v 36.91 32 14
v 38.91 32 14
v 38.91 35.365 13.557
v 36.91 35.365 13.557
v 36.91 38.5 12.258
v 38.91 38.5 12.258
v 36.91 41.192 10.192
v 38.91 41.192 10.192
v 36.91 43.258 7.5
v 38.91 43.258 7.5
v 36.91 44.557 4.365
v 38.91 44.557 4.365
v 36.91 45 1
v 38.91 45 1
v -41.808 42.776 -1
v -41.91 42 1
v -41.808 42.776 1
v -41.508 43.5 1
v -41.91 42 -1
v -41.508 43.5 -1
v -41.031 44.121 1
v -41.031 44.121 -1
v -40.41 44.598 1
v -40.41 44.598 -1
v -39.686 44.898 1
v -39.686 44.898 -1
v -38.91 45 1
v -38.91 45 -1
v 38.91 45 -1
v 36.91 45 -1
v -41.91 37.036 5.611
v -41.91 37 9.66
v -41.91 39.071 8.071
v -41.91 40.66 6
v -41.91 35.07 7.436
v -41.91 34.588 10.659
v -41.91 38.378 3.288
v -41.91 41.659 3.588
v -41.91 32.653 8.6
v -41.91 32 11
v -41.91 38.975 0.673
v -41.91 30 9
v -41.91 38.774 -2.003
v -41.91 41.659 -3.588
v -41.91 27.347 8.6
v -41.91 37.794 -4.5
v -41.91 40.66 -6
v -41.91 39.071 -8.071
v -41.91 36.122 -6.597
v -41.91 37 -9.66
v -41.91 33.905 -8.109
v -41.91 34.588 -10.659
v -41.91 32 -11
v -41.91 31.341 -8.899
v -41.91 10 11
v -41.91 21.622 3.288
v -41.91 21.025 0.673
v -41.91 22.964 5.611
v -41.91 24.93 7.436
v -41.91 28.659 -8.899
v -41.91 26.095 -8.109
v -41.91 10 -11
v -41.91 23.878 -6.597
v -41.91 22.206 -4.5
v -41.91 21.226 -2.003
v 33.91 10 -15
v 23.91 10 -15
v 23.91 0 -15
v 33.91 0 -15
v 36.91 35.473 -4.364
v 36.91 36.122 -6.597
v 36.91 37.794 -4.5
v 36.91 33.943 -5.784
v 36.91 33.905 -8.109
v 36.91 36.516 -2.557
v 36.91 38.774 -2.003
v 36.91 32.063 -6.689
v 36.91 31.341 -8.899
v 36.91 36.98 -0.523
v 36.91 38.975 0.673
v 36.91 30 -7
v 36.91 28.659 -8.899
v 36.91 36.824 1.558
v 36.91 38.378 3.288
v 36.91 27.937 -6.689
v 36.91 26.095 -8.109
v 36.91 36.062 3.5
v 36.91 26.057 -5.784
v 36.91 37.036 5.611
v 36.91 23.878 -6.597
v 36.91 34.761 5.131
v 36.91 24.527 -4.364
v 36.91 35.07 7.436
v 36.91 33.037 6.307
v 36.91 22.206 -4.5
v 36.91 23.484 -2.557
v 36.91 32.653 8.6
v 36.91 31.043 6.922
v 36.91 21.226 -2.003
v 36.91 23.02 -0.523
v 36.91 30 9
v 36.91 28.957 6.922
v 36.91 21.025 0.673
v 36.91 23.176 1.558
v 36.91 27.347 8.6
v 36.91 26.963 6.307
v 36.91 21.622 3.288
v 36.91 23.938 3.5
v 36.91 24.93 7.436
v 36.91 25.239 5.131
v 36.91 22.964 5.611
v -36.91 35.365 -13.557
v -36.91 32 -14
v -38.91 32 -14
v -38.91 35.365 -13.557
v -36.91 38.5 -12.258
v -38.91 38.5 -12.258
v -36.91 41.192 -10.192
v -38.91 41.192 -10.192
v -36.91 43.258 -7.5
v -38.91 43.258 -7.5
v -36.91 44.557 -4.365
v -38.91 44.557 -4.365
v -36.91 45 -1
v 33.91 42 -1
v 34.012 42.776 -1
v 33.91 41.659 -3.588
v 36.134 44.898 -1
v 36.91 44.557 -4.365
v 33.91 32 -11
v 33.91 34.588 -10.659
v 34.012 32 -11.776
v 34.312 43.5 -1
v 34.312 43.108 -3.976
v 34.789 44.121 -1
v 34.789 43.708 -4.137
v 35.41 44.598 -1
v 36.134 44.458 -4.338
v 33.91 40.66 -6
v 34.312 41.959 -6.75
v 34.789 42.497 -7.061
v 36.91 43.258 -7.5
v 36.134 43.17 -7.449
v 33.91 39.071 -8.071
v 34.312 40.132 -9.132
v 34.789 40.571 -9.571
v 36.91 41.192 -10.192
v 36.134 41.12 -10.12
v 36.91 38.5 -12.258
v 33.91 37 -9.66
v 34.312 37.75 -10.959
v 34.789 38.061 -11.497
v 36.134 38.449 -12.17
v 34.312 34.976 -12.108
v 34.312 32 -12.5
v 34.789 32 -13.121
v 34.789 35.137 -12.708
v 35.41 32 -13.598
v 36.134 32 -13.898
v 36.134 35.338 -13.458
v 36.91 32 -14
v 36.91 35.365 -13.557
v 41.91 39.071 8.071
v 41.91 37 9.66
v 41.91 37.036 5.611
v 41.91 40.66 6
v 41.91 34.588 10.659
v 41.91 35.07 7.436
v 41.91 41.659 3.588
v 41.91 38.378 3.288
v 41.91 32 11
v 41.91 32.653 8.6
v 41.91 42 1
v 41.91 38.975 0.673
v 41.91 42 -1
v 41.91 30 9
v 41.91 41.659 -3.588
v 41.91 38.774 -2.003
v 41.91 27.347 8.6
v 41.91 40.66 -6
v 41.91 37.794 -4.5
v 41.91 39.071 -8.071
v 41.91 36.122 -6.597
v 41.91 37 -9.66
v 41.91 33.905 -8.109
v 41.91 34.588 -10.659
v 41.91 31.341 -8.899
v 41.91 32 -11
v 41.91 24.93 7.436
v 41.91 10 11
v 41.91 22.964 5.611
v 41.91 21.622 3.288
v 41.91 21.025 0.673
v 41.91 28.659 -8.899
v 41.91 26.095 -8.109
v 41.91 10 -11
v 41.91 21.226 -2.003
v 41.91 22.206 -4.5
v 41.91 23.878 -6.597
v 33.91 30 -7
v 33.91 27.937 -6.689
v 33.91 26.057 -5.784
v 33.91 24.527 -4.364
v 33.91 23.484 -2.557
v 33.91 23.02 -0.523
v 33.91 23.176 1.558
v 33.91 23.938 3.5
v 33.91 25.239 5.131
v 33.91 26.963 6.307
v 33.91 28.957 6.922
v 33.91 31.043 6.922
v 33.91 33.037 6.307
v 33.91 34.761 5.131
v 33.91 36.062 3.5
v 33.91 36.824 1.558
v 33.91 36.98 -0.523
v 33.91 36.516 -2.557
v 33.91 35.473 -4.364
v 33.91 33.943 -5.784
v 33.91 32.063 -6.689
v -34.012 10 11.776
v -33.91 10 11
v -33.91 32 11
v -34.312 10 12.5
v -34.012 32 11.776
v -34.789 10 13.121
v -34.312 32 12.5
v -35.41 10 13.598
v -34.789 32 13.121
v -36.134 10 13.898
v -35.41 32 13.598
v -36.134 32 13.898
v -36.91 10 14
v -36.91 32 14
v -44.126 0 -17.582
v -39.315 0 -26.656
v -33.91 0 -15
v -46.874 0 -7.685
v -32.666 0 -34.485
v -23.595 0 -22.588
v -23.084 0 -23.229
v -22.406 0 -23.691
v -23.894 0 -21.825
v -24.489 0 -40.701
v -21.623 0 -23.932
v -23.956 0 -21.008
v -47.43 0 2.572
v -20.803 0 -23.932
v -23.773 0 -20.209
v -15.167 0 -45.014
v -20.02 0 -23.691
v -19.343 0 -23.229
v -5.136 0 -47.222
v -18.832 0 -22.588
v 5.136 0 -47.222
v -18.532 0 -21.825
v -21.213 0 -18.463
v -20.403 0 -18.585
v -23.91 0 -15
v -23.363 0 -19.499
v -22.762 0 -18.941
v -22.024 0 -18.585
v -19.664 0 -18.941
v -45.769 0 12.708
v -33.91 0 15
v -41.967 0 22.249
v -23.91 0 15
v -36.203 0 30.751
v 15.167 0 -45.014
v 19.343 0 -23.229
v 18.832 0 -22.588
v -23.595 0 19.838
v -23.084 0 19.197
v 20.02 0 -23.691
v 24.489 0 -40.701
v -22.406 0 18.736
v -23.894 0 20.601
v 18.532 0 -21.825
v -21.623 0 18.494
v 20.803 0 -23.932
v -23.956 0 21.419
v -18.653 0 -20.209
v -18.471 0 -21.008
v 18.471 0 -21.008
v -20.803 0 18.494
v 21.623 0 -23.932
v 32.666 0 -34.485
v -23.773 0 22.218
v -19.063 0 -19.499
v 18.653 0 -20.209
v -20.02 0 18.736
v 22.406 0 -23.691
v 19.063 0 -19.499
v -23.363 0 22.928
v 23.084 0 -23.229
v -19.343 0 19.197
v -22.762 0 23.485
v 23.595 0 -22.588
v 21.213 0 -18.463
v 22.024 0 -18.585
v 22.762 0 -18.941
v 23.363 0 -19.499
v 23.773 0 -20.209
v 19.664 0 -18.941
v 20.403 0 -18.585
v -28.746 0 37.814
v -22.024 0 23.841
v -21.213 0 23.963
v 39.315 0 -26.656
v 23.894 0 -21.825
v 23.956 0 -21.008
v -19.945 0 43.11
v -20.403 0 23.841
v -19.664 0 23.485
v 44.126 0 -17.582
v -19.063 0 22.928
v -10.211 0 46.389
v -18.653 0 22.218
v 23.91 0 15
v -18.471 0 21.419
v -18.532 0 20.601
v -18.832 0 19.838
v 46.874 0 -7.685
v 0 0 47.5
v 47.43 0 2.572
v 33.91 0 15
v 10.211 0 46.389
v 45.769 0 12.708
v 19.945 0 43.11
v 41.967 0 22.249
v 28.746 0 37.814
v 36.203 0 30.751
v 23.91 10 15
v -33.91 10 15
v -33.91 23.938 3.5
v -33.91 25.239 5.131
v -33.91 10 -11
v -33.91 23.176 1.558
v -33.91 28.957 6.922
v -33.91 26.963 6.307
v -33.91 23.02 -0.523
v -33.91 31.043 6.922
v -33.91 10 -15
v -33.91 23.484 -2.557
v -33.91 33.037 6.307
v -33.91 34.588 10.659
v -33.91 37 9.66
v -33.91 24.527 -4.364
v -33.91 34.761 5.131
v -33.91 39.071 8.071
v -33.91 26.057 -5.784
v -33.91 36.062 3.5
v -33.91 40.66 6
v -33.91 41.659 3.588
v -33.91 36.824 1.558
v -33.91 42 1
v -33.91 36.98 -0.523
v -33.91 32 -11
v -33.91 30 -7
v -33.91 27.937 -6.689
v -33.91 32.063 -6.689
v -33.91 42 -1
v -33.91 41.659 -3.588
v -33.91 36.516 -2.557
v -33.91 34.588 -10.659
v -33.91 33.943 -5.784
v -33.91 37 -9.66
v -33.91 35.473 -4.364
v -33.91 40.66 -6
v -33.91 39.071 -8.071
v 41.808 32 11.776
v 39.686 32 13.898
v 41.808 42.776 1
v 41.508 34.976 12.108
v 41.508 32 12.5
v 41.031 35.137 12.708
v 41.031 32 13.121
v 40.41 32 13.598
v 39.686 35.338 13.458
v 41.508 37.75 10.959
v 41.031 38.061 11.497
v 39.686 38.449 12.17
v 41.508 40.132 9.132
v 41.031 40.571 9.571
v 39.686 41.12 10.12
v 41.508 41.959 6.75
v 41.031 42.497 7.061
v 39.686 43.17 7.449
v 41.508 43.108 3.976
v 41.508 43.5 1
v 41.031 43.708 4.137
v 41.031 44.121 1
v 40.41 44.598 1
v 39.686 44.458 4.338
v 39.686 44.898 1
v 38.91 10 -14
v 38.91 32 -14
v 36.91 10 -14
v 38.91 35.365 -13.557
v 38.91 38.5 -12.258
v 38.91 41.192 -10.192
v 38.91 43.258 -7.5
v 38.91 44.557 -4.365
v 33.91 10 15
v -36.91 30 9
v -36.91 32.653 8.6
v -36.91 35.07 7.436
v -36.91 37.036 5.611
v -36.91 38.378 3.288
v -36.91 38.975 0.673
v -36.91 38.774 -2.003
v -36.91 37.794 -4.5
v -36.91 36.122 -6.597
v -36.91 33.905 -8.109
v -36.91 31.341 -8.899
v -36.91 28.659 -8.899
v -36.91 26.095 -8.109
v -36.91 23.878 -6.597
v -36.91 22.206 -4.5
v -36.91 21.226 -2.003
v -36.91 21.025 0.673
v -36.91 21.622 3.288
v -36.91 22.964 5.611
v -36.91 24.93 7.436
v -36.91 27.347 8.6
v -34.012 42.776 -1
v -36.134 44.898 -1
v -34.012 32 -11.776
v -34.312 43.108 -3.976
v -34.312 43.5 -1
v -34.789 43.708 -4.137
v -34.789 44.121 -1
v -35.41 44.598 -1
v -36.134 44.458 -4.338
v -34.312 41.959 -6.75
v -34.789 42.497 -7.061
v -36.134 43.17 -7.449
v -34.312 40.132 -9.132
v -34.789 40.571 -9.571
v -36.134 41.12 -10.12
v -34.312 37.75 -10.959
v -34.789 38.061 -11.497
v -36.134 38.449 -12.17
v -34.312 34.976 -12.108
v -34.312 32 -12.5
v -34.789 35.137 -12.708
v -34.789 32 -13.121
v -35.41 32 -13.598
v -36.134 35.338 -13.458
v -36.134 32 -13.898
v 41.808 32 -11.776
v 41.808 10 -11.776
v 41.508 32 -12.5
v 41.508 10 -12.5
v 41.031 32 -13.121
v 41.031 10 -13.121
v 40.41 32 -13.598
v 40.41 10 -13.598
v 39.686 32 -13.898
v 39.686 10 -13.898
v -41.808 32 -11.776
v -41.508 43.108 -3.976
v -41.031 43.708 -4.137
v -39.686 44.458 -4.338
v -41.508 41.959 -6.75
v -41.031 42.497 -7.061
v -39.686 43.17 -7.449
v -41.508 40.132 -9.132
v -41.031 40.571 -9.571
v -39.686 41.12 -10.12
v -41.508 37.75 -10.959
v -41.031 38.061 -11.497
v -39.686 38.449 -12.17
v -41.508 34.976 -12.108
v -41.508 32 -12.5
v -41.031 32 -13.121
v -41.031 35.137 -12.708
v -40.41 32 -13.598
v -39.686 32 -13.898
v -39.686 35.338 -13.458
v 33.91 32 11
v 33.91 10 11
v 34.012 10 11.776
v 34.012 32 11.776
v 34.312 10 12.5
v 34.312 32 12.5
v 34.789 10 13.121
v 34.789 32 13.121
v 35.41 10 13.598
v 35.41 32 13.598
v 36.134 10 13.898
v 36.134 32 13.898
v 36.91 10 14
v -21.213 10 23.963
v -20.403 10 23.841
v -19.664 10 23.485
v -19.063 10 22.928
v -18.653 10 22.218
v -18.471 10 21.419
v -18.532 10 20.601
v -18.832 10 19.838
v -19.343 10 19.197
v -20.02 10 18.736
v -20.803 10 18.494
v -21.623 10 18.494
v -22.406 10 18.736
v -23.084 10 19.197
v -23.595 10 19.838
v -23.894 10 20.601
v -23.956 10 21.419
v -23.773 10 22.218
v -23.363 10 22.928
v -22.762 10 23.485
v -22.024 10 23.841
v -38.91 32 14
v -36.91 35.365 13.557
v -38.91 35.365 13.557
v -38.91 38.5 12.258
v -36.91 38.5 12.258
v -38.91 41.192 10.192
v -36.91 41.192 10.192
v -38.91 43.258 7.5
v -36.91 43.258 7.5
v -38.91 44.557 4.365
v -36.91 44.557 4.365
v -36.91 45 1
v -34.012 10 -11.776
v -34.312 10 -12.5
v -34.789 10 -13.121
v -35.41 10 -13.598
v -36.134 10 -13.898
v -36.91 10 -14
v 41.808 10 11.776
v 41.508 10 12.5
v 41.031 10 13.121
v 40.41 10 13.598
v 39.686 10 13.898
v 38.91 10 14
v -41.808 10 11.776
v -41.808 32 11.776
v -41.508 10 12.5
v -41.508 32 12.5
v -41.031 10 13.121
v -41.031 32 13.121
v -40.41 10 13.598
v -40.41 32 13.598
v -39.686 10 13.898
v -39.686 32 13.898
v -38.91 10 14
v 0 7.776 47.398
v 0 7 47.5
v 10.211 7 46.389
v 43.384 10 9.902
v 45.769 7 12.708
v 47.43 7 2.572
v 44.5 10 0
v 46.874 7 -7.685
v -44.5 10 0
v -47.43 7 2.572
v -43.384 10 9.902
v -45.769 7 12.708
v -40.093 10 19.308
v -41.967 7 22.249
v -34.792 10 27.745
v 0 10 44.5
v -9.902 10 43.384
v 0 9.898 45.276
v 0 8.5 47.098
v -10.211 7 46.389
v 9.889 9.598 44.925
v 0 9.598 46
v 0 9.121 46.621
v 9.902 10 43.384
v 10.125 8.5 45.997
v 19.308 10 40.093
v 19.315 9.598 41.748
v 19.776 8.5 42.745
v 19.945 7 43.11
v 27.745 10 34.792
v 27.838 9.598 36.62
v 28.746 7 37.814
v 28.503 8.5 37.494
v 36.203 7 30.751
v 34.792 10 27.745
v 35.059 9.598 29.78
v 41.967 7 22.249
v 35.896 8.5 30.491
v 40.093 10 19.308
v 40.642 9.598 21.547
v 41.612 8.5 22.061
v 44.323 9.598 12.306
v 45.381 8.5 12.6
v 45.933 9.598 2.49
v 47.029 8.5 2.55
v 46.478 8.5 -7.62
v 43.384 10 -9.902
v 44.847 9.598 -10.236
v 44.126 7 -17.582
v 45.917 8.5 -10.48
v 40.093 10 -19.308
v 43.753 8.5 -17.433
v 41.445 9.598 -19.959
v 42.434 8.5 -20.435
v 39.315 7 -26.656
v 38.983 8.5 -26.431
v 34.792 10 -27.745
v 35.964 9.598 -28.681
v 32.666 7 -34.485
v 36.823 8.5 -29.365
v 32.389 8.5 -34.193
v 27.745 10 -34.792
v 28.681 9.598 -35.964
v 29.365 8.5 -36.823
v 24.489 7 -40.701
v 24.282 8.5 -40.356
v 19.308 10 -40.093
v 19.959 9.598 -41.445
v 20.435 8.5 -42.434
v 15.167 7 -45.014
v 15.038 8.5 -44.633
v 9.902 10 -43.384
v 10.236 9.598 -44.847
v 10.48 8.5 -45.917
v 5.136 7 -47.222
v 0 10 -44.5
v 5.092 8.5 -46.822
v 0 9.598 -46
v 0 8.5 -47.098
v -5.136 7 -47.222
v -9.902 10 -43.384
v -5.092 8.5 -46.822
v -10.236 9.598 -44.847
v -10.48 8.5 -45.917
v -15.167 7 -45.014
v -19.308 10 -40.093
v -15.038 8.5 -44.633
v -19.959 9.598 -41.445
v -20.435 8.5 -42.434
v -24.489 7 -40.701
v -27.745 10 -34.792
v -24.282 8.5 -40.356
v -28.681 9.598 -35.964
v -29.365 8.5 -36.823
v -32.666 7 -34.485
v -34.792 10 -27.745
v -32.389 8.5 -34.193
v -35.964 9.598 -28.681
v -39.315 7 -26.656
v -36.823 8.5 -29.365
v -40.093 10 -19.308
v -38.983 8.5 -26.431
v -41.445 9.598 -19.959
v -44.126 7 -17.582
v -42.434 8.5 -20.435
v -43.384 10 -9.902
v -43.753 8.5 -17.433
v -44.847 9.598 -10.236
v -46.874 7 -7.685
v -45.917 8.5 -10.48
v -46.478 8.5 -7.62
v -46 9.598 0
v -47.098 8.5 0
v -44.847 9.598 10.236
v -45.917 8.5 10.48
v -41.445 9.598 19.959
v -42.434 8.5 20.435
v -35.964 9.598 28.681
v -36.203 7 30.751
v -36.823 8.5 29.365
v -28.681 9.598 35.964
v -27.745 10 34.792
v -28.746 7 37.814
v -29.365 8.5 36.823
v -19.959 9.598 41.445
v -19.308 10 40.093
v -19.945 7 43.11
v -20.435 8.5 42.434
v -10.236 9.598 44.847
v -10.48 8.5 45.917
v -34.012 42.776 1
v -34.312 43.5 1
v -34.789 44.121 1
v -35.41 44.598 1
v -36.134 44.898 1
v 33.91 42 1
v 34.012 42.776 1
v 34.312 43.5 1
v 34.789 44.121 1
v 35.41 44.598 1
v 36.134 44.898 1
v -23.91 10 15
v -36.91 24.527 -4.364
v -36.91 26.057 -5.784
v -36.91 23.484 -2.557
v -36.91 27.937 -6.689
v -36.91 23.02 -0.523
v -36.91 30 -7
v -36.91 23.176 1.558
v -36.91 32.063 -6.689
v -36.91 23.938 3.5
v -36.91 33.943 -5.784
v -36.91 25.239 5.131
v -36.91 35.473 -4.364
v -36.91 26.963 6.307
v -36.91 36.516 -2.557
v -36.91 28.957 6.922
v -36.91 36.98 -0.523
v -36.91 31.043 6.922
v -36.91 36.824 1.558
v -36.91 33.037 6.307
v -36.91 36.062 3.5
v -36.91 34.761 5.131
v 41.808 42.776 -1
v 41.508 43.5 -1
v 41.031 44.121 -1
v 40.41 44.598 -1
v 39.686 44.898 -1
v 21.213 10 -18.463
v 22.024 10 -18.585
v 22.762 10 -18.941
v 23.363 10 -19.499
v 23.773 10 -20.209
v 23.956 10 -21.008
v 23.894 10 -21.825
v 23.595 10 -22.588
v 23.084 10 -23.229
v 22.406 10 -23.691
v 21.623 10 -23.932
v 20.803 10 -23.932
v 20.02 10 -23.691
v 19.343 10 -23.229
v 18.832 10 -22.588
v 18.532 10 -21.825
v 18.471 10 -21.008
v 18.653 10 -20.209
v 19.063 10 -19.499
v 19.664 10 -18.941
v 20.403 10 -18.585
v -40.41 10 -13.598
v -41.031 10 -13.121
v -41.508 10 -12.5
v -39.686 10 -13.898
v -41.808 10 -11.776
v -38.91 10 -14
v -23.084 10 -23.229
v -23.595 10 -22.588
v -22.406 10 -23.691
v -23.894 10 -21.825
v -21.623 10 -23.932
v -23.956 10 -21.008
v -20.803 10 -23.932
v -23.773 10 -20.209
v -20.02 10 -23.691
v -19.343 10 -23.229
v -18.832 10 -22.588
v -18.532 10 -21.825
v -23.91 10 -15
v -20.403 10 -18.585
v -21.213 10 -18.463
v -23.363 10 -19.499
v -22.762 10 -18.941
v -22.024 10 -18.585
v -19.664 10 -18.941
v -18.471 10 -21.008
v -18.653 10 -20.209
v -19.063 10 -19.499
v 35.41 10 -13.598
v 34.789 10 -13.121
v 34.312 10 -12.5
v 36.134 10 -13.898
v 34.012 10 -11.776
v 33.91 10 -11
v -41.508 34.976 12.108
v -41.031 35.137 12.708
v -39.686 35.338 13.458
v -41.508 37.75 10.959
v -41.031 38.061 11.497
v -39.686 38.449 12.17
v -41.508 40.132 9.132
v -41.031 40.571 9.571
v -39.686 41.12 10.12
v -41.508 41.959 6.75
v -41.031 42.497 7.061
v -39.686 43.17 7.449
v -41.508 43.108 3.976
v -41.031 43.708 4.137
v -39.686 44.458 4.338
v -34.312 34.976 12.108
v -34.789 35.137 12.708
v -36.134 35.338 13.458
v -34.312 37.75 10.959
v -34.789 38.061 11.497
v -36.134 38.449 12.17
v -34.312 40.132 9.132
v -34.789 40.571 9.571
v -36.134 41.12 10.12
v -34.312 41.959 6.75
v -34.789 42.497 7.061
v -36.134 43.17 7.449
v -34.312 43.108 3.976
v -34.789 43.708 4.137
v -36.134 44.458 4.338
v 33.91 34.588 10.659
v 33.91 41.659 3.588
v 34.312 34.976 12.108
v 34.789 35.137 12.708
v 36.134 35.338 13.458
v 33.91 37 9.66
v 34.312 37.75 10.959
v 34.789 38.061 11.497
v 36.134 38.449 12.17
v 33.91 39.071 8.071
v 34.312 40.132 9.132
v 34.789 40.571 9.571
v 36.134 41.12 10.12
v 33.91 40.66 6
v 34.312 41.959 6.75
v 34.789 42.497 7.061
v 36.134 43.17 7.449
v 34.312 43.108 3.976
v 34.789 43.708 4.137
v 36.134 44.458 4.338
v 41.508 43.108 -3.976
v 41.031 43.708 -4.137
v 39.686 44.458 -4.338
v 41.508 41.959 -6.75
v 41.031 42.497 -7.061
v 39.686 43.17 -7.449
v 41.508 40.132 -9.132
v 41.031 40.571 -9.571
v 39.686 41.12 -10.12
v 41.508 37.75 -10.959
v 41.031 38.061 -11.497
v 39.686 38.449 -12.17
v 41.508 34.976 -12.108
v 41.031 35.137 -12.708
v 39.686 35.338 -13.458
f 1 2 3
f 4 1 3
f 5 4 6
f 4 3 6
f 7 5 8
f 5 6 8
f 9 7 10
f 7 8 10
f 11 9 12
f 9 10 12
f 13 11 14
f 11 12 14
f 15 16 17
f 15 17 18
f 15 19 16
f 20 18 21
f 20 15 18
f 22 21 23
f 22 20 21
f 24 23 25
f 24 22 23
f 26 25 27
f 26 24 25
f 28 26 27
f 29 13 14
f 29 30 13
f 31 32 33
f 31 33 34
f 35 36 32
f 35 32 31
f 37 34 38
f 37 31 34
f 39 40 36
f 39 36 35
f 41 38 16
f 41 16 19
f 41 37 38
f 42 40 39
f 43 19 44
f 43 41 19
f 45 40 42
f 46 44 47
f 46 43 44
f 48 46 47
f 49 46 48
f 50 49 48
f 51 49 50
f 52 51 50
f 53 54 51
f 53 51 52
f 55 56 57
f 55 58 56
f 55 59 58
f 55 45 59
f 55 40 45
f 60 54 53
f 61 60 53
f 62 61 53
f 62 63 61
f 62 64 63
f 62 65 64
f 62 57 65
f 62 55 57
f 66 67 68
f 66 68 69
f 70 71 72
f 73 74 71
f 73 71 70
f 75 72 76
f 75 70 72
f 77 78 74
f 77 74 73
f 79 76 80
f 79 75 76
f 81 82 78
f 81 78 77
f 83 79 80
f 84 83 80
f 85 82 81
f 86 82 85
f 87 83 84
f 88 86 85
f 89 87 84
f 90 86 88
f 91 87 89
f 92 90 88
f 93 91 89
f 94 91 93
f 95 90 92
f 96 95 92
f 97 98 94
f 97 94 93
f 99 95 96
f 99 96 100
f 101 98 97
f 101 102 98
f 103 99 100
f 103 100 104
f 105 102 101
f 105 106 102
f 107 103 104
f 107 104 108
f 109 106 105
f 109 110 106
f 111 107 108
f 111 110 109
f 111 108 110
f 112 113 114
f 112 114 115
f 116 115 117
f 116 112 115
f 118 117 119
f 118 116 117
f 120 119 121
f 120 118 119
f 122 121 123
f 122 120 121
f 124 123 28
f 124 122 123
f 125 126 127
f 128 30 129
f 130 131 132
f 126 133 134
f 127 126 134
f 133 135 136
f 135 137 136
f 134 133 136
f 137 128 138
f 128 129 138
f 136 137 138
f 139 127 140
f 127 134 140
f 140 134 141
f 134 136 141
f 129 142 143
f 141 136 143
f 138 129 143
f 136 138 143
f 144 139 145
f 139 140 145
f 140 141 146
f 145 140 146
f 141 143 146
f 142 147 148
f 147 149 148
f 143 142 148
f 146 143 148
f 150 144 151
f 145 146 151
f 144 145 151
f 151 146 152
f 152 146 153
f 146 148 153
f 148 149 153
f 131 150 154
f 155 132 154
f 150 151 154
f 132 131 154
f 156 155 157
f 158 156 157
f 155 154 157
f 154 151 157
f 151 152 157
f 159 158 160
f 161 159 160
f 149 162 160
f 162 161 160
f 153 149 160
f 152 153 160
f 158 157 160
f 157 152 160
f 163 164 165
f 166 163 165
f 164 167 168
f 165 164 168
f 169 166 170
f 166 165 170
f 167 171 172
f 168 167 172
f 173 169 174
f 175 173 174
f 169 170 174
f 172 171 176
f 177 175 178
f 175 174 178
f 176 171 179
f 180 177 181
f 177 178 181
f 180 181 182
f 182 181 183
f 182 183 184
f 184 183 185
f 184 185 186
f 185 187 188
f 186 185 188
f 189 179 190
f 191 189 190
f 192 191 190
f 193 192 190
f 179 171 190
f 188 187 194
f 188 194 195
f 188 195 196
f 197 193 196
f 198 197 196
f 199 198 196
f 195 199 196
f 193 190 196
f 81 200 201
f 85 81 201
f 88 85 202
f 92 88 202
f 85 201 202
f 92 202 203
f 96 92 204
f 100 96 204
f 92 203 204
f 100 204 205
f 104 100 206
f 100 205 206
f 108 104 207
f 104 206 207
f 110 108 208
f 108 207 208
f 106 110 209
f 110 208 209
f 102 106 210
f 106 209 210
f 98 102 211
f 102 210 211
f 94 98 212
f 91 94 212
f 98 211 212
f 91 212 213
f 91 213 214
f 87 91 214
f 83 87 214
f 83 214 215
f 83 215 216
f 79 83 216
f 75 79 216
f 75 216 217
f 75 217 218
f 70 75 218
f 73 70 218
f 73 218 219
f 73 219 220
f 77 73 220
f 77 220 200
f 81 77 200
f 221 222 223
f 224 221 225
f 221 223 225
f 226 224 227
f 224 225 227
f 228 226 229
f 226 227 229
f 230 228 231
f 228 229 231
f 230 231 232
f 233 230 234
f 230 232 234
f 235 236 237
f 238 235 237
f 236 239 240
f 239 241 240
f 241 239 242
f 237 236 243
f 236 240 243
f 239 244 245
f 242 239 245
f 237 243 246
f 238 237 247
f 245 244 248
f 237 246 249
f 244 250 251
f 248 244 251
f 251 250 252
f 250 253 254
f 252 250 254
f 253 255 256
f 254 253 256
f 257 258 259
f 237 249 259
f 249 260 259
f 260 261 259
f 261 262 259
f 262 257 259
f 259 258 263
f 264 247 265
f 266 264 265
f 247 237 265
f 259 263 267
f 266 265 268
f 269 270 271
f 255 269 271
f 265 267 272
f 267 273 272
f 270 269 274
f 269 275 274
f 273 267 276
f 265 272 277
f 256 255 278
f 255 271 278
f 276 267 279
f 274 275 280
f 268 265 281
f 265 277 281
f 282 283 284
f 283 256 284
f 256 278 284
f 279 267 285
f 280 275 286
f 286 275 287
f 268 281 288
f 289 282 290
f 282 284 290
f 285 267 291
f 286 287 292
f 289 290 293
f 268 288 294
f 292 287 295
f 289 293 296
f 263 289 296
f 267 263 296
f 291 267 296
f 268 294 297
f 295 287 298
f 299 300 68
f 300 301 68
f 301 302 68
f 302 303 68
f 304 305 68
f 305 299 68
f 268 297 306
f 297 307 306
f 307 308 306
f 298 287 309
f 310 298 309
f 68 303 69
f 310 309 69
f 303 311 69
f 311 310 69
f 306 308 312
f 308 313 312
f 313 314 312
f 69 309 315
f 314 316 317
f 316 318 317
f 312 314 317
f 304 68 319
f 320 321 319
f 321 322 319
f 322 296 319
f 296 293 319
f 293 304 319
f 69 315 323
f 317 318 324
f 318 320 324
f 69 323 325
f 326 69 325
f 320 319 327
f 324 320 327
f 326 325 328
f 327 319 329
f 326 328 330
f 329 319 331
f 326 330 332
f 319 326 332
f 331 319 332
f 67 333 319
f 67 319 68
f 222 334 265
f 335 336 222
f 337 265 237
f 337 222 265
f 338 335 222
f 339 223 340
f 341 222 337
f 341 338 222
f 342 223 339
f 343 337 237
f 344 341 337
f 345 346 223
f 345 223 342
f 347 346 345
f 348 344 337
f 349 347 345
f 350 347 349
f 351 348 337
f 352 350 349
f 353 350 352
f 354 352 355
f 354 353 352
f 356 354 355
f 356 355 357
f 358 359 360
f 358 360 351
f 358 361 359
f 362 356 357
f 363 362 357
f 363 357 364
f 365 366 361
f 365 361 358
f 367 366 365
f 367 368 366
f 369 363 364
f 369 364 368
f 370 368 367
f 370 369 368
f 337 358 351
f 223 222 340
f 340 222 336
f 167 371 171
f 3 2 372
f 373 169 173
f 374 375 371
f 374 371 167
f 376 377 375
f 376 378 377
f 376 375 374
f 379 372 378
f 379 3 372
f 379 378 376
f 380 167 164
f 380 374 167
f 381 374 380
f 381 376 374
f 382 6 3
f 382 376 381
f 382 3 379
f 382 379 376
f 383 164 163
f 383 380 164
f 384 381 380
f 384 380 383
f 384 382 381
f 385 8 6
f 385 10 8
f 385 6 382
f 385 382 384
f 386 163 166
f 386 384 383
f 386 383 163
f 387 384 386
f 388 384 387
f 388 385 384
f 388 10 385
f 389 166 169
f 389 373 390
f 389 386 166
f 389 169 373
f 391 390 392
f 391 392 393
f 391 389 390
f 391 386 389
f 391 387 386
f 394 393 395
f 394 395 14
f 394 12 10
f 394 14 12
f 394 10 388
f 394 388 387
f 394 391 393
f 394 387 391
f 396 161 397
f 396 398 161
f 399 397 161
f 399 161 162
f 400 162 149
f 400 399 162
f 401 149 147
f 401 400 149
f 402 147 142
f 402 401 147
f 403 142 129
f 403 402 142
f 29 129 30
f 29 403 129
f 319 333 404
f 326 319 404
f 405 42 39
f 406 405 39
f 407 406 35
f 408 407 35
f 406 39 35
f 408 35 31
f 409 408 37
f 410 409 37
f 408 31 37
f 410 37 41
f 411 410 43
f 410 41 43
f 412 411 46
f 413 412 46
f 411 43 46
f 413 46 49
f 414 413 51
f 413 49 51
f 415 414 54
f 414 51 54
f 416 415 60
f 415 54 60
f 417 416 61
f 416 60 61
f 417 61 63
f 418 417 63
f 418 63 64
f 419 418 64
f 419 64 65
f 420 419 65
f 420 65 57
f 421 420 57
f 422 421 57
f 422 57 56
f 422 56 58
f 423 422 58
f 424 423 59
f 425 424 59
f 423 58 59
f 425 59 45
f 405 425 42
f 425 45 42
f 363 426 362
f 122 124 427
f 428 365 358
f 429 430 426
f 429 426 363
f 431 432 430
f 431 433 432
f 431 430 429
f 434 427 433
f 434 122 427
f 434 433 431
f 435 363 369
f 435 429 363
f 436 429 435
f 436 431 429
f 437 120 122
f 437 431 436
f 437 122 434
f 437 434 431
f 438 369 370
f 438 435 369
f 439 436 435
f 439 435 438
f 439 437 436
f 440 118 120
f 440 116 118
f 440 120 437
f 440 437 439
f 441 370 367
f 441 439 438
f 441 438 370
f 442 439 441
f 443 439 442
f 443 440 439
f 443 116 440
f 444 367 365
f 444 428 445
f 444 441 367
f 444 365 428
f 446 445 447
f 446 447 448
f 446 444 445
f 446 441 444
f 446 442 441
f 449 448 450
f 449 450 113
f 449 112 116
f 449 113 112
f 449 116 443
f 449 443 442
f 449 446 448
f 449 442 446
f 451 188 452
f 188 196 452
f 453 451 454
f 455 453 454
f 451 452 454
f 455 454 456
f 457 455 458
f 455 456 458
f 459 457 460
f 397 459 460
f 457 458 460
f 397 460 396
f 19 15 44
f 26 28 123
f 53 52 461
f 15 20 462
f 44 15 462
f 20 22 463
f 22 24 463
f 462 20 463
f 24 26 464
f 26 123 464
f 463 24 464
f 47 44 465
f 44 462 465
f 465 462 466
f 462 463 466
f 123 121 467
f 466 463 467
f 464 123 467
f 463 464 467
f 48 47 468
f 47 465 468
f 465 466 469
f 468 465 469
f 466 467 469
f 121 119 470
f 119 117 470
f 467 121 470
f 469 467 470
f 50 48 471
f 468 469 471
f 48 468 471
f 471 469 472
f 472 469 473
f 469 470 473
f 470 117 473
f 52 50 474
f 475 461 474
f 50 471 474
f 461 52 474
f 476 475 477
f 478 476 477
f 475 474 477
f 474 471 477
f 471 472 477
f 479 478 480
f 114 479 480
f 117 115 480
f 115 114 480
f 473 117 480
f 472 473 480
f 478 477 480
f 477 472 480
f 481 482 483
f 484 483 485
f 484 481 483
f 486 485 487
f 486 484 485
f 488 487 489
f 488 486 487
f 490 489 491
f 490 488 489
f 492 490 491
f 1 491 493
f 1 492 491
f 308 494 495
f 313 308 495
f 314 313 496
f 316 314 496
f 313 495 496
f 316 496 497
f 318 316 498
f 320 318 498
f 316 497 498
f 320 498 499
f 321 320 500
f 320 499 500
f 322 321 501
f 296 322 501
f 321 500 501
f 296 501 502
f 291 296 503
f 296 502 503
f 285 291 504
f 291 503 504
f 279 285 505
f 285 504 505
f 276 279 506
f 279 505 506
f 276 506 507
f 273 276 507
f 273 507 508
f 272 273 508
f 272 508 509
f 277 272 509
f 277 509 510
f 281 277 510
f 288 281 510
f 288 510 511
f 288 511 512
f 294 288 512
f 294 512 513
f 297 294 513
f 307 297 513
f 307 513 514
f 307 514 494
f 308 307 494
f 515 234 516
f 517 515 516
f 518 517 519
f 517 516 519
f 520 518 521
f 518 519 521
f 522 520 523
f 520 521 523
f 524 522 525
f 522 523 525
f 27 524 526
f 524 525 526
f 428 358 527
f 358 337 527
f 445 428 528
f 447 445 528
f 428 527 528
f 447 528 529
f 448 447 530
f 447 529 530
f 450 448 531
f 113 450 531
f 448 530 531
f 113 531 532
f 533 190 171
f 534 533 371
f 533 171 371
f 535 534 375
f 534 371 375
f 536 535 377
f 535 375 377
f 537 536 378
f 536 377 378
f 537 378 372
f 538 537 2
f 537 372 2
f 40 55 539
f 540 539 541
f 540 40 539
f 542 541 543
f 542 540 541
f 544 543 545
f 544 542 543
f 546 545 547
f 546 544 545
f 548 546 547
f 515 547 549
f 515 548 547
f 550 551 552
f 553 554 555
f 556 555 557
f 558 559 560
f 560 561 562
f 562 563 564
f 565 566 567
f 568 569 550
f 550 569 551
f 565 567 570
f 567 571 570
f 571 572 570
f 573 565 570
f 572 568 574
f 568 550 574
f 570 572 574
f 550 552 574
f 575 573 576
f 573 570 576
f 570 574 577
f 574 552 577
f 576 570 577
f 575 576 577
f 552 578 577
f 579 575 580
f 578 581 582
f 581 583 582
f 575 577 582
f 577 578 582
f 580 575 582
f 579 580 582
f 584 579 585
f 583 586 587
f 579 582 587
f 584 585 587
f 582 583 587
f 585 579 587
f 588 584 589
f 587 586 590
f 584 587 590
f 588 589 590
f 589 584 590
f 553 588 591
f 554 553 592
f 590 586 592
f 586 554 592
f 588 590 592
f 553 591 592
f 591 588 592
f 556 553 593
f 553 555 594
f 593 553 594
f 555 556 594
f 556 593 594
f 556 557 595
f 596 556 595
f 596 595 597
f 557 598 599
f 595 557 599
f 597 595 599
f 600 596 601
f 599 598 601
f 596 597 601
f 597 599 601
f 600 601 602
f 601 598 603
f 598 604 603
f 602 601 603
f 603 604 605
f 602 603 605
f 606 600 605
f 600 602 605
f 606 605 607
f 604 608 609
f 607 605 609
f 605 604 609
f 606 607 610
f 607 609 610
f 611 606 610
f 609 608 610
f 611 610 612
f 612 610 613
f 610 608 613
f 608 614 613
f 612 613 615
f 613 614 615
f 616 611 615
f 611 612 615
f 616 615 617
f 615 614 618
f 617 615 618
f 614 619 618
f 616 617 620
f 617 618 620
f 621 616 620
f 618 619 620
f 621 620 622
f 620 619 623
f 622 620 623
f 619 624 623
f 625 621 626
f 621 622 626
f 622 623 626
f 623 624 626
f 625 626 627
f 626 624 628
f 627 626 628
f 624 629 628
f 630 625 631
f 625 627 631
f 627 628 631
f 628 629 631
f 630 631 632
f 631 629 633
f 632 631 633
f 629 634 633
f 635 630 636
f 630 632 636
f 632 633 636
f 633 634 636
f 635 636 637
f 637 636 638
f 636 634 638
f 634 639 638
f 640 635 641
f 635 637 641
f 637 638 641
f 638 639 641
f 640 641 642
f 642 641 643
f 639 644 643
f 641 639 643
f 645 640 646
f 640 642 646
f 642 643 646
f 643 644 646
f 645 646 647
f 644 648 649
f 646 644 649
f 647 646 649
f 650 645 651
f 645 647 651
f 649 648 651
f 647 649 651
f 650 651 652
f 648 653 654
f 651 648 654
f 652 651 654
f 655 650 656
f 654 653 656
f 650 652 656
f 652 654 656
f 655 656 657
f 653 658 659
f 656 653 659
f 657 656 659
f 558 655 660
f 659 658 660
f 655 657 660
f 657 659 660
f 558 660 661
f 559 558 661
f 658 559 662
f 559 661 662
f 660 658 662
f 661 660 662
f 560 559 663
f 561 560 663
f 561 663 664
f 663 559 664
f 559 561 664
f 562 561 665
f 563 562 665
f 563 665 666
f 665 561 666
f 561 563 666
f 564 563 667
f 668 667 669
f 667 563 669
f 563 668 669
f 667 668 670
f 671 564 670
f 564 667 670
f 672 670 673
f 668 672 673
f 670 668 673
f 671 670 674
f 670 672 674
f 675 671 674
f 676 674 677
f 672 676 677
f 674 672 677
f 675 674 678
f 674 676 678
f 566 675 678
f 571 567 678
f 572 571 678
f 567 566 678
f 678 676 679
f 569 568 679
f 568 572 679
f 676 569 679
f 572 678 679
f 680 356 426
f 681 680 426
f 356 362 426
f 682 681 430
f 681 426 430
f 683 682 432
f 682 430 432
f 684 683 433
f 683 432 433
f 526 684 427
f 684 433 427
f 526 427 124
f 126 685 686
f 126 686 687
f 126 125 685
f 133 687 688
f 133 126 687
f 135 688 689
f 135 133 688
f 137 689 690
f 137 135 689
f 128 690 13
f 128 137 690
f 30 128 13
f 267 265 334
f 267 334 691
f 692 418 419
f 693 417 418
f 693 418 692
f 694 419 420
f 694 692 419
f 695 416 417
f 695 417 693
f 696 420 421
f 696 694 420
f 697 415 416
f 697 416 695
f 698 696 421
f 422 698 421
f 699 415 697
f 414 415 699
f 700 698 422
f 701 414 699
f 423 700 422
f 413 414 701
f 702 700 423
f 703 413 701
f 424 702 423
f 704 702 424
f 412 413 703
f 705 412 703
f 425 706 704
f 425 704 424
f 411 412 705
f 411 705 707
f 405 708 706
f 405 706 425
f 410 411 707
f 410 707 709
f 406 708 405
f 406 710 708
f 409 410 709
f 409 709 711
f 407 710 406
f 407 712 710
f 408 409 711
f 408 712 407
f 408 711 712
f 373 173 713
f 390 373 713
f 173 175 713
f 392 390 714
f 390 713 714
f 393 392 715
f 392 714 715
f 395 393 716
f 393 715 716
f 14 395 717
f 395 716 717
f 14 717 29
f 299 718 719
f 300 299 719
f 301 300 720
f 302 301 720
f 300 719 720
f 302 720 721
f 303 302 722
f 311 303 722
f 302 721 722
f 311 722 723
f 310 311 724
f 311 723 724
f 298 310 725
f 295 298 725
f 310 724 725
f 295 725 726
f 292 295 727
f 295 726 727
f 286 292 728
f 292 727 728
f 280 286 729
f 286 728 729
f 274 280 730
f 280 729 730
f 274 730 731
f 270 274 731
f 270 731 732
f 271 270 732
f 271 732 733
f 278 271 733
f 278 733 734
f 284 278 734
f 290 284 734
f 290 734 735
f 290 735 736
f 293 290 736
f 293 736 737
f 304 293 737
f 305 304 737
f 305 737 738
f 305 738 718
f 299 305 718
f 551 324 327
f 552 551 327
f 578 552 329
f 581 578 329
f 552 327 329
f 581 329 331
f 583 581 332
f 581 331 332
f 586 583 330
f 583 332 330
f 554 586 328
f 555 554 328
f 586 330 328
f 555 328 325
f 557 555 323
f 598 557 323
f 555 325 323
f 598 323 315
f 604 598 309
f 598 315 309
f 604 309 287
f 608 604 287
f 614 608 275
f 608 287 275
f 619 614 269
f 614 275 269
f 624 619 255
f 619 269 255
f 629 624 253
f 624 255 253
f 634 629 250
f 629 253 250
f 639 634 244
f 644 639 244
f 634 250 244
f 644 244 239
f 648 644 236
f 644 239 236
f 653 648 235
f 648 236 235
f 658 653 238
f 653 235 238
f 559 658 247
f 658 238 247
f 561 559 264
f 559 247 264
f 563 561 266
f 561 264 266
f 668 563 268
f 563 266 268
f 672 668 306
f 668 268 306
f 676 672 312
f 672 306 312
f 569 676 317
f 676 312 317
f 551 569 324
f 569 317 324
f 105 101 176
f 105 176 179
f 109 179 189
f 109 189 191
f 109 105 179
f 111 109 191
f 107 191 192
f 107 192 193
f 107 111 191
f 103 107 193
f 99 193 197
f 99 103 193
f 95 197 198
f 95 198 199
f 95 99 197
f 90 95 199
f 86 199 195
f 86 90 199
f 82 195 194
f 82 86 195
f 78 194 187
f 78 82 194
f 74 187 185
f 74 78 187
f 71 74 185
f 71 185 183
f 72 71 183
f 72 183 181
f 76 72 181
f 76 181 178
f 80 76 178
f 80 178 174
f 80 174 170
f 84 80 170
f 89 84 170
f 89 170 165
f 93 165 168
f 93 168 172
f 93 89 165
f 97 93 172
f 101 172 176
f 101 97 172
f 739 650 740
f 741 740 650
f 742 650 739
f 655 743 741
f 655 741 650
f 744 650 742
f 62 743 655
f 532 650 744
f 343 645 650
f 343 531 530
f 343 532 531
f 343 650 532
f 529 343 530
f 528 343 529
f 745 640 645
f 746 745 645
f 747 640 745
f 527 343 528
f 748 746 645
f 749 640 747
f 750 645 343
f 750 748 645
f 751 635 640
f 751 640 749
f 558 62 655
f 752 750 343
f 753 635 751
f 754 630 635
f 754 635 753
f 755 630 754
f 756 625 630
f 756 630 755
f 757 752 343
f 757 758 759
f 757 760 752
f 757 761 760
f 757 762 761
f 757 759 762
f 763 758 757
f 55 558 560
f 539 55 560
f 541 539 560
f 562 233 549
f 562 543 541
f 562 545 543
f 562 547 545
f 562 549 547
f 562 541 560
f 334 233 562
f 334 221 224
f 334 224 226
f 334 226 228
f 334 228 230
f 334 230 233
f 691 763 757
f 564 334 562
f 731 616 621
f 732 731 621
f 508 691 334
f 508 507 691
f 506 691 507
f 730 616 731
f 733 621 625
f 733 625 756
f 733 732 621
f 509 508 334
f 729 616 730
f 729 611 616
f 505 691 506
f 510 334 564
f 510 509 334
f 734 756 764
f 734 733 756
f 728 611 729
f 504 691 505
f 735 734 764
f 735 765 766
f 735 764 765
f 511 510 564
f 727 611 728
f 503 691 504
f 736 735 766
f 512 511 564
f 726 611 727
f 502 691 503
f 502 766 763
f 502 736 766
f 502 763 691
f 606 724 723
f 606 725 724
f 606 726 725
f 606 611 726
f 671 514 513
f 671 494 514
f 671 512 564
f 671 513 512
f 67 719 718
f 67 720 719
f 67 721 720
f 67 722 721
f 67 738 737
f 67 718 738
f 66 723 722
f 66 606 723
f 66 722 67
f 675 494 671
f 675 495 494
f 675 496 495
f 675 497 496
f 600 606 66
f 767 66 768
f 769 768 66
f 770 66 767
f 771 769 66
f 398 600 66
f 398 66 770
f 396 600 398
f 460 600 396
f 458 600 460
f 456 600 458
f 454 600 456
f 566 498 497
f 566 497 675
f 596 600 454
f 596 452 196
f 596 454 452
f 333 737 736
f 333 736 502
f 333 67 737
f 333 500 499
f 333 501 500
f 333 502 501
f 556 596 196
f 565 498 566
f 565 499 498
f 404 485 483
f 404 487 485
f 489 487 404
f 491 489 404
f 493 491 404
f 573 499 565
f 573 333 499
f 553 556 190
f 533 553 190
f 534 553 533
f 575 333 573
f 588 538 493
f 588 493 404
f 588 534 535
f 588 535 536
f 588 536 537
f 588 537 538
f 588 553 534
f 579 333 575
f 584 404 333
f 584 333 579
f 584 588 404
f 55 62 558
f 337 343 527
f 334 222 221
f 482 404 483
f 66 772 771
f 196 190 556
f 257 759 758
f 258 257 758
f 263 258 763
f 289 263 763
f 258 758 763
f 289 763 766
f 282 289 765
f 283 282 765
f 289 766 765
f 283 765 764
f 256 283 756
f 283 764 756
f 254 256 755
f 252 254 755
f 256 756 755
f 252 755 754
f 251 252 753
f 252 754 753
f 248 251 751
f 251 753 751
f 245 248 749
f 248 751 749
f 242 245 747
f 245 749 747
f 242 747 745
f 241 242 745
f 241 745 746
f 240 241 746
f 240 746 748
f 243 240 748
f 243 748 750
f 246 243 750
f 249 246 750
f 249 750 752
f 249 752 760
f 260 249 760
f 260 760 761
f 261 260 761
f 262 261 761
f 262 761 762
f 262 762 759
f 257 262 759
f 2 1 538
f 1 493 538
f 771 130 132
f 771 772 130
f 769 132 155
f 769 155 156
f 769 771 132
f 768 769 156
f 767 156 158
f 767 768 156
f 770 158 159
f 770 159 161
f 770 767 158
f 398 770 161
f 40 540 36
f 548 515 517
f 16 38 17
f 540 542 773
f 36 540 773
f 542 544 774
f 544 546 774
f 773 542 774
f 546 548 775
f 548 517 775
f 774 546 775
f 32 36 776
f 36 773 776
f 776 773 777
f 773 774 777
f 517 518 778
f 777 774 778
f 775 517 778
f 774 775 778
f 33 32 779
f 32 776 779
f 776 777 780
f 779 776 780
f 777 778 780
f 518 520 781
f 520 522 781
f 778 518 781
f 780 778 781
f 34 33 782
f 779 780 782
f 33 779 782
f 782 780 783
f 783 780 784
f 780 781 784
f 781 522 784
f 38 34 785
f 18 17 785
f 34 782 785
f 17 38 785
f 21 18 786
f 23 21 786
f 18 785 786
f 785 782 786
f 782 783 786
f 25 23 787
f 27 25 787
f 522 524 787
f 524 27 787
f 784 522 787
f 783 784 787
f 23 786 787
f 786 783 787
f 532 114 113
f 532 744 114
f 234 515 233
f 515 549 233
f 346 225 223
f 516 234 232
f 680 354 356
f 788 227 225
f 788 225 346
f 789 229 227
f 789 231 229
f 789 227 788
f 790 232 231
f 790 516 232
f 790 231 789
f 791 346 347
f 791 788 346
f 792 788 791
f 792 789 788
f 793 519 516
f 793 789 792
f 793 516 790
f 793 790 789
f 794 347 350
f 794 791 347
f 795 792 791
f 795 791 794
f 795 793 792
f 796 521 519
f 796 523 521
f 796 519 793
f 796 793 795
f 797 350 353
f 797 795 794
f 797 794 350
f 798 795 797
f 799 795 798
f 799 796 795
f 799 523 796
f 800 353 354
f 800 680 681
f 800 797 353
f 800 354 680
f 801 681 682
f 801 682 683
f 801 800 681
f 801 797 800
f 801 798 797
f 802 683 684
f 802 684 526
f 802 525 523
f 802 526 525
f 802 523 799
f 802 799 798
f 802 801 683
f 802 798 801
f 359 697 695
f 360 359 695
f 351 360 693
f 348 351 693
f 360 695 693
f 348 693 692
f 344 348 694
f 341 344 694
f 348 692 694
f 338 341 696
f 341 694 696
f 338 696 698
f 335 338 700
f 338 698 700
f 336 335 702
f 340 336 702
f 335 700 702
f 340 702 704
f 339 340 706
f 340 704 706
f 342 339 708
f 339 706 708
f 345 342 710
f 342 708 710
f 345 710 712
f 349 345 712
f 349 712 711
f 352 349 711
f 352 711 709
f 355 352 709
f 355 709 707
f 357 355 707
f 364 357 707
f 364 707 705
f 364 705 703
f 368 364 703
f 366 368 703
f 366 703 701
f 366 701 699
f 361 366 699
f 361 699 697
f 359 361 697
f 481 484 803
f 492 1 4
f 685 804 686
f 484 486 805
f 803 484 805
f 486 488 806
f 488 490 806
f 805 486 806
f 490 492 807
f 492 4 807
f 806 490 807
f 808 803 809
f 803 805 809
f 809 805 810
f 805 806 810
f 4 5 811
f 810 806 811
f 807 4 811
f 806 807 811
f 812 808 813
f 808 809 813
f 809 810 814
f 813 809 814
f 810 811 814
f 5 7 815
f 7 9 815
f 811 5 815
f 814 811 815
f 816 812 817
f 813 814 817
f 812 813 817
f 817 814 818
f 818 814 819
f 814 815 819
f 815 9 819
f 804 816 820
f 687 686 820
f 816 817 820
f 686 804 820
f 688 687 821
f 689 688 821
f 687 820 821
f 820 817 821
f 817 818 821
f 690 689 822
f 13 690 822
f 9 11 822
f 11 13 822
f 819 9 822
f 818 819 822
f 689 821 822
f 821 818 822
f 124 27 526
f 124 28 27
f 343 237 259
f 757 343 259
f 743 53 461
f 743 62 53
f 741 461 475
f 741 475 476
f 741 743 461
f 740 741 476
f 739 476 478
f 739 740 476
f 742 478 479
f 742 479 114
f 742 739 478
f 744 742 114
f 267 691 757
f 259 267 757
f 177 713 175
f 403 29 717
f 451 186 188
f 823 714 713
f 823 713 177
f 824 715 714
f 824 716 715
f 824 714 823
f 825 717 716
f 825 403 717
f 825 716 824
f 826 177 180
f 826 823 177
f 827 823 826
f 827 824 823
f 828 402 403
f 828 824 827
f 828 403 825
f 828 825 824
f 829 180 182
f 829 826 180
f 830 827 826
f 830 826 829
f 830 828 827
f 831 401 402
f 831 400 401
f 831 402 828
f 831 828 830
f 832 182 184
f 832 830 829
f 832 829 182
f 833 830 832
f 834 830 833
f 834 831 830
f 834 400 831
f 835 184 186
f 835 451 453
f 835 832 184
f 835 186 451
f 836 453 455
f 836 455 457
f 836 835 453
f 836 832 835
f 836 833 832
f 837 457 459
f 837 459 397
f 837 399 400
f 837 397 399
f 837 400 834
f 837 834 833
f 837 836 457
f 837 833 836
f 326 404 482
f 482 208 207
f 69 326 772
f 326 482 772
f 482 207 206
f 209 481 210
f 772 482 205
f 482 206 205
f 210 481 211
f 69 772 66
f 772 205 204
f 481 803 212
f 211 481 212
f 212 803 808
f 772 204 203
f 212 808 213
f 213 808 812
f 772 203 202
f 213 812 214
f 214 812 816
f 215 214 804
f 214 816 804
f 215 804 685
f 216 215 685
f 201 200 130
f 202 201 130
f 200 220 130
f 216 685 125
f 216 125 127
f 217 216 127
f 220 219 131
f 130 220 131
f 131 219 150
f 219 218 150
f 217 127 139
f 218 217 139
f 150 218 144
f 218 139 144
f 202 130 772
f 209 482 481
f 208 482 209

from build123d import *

# Parameters (mm, degrees)
SKETCH1_R           = 47.5
BOSS_EXTRUDE1_DEPTH = 10
SKETCH2_W           = 8
SKETCH2_H           = 28
BOSS_EXTRUDE2_DEPTH = 35
SKETCH3_R           = 2.75
CUT_EXTRUDE1_DEPTH  = 70
SKETCH4_R           = 9
CUT_EXTRUDE2_DEPTH  = 5
CUT_EXTRUDE3_START  = -5
SKETCH5_R           = 9
CUT_EXTRUDE3_DEPTH  = 5
SKETCH6_R           = 7
CUT_EXTRUDE4_DEPTH  = 107.800272003
FILLET1_R           = 13
FILLET2_R           = 3
FILLET3_R           = 3
SKETCH7_W           = 10
SKETCH7_H           = 30
CUT_EXTRUDE5_DEPTH  = 76.7462871


with BuildPart() as part:
    # Sketch1 → Boss-Extrude1 (new body)
    with BuildSketch(Plane(origin=(0, 0, 0), x_dir=(1, 0, 0), z_dir=(0, 1, 0))):
        with Locations(Location((0, 0, 0), (0, 0, 270))):
            Circle(SKETCH1_R)
    extrude(amount=BOSS_EXTRUDE1_DEPTH)

    # Sketch2 → Boss-Extrude2 (add)
    with BuildSketch(Plane(origin=(0, 10, 0), x_dir=(1, 0, 0), z_dir=(0, 1, 0))):
        with Locations((-37.91, 0)):
            Rectangle(SKETCH2_W, SKETCH2_H)
        with Locations((37.91, 0)):
            Rectangle(SKETCH2_W, SKETCH2_H)
    extrude(amount=BOSS_EXTRUDE2_DEPTH)

    # Sketch3 → Cut-Extrude1 (cut)
    with BuildSketch(Plane(origin=(0, 10, 0), x_dir=(1, 0, 0), z_dir=(0, 1, 0))):
        with Locations(Location((-21.213203436, 21.213203436, 0), (0, 0, 270))):
            Circle(SKETCH3_R)
        with Locations(Location((21.213203436, 21.213203436, 0), (0, 0, 270))):
            Circle(SKETCH3_R)
        with Locations(Location((-21.213203436, -21.213203436, 0), (0, 0, 270))):
            Circle(SKETCH3_R)
    extrude(amount=-CUT_EXTRUDE1_DEPTH, mode=Mode.SUBTRACT)

    # Sketch4 → Cut-Extrude2 (cut)
    with BuildSketch(Plane.ZY.offset(41.91)):
        with Locations((0, 30)):
            Circle(SKETCH4_R)
    extrude(amount=-CUT_EXTRUDE2_DEPTH, mode=Mode.SUBTRACT)

    # Sketch5 → Cut-Extrude3 (cut)
    with BuildSketch(Plane(origin=(41.91, 0, 0), x_dir=(0, 0, -1), z_dir=(1, 0, 0)).offset(CUT_EXTRUDE3_START)):
        with Locations(Location((0, 30, 0), (0, 0, 180))):
            Circle(SKETCH5_R)
    extrude(amount=CUT_EXTRUDE3_DEPTH, mode=Mode.SUBTRACT)

    # Sketch6 → Cut-Extrude4 (cut, through all)
    with BuildSketch(Plane.ZY.offset(36.91)):
        with Locations(Location((0, 30, 0), (0, 0, 180))):
            Circle(SKETCH6_R)
    extrude(amount=-CUT_EXTRUDE4_DEPTH, mode=Mode.SUBTRACT)

    # Fillet1
    fillet1_edges = [part.edges().sort_by_distance(p)[0] for p in [
        (-37.91, 45, -14),
        (37.91, 45, -14),
        (37.91, 45, 14),
        (-37.91, 45, 14),
    ]]
    fillet(fillet1_edges, radius=FILLET1_R)

    # Fillet2
    fillet2_edges = [part.edges().sort_by_distance(p)[0] for p in [
        (33.91, 45, 0),
        (41.91, 45, 0),
        (41.91, 21, -14),
        (41.91, 21, 14),
        (41.91, 41.192388155, -10.192388155),
        (41.91, 41.192388155, 10.192388155),
        (33.91, 21, 14),
        (33.91, 21, -14),
        (33.91, 41.192388155, -10.192388155),
        (33.91, 41.192388155, 10.192388155),
        (-41.91, 45, 0),
        (-33.91, 45, 0),
        (-41.91, 21, 14),
        (-41.91, 21, -14),
        (-41.91, 41.192388155, 10.192388155),
        (-41.91, 41.192388155, -10.192388155),
        (-33.91, 21, -14),
        (-33.91, 21, 14),
        (-33.91, 41.192388155, 10.192388155),
        (-33.91, 41.192388155, -10.192388155),
    ]]
    fillet(fillet2_edges, radius=FILLET2_R)

    # Fillet3
    fillet3_edges = [part.edges().sort_by_distance(p)[0] for p in [
        (0, 10, -47.5),
    ]]
    fillet(fillet3_edges, radius=FILLET3_R)

    # Sketch7 → Cut-Extrude5 (cut, through all)
    with BuildSketch(Plane(origin=(0, 10, 0), x_dir=(1, 0, 0), z_dir=(0, 1, 0))):
        with Locations((-28.91, 0)):
            Rectangle(SKETCH7_W, SKETCH7_H)
        with Locations((28.91, 0)):
            Rectangle(SKETCH7_W, SKETCH7_H)
    extrude(amount=-CUT_EXTRUDE5_DEPTH, mode=Mode.SUBTRACT)


solid = part.part
